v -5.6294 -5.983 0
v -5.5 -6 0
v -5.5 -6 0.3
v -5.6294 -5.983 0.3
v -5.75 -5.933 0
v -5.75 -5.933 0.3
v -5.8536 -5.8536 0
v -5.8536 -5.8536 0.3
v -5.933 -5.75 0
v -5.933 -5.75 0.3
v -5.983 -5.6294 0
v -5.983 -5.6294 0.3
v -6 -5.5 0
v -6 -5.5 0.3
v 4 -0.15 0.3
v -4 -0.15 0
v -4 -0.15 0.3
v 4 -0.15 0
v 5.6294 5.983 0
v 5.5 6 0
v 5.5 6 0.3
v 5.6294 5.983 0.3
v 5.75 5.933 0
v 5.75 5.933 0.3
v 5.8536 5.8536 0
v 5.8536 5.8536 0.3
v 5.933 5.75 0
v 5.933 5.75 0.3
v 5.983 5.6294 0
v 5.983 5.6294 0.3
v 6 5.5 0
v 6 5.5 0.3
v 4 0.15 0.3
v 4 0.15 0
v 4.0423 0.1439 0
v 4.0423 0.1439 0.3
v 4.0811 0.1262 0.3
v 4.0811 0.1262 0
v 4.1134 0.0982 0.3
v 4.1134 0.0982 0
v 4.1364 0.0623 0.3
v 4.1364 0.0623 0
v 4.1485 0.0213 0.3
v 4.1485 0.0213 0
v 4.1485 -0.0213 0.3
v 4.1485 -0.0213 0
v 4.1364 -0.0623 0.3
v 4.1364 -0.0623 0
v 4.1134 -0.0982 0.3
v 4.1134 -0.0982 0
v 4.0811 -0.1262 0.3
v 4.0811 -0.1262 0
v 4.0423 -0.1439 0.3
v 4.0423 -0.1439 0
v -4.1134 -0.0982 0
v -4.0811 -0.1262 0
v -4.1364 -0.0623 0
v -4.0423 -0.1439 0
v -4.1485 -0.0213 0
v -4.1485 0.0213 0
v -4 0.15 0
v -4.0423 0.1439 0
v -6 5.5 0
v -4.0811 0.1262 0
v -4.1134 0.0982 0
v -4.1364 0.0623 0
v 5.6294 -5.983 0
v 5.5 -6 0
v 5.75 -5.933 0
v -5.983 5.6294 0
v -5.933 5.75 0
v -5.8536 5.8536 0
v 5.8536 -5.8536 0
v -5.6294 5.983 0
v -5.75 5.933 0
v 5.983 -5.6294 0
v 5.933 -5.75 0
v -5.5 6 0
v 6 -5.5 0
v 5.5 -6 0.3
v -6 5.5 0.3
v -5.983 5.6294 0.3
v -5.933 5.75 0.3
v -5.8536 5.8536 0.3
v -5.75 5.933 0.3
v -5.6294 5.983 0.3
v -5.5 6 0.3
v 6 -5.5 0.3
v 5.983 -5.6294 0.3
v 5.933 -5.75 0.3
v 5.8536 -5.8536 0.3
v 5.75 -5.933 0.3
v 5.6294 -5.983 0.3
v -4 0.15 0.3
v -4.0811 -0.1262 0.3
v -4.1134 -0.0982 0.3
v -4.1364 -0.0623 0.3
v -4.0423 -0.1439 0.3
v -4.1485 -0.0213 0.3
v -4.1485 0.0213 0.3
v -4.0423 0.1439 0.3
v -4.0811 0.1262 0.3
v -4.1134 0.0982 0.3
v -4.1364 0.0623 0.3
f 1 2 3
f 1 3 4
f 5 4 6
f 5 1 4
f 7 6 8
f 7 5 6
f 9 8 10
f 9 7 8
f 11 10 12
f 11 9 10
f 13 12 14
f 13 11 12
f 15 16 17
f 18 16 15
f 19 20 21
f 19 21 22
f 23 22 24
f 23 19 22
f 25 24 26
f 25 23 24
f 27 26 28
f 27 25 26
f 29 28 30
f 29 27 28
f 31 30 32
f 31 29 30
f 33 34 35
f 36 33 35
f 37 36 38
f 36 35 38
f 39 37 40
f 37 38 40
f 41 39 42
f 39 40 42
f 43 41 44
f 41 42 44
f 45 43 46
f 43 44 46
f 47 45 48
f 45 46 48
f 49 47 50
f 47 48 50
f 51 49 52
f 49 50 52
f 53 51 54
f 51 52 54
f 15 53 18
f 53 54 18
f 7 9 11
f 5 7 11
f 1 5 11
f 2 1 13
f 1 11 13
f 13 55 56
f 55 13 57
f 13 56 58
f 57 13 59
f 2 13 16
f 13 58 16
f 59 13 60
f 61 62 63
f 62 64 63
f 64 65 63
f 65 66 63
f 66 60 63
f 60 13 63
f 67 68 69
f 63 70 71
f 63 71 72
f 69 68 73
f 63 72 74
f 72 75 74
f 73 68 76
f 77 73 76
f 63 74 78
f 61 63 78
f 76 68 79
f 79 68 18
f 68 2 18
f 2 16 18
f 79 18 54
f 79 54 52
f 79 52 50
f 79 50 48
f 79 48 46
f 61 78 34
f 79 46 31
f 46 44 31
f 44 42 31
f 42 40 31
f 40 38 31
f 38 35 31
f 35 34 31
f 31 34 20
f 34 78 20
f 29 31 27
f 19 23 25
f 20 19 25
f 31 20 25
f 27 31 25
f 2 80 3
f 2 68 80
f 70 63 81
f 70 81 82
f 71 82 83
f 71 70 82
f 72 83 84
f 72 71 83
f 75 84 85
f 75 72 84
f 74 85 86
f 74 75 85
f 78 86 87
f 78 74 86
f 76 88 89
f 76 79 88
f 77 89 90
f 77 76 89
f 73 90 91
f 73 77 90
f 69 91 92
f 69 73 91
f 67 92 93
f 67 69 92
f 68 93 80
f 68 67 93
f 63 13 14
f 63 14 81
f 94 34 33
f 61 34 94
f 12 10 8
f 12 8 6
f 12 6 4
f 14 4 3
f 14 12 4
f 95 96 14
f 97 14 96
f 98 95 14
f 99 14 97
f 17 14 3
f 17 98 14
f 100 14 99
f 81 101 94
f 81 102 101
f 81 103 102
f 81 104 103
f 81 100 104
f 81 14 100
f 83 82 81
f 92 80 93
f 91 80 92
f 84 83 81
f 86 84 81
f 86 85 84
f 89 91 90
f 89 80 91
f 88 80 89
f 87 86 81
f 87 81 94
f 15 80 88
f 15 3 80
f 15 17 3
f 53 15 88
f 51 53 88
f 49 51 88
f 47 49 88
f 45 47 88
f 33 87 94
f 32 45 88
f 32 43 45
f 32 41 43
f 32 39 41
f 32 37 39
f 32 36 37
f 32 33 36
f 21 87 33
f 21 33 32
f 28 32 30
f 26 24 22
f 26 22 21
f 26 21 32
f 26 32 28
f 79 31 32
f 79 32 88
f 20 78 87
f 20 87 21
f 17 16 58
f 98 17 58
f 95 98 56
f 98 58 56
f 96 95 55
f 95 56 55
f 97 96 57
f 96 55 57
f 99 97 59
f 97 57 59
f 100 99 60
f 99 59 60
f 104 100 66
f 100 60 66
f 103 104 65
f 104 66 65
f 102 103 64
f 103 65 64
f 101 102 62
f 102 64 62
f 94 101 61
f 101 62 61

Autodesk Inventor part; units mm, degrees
ref_plane "YZ Plane" through (0, 0, 0) normal (1, 0, 0) x (0, 1, 0)
ref_plane "XZ Plane" through (0, 0, 0) normal (0, 1, 0) x (-1, 0, 0)
ref_plane "XY Plane" through (0, 0, 0) normal (0, 0, 1) x (1, 0, 0)
sketch "Sketch1" plane through (0, 0, 0) normal (0, 0, 1) x (1, 0, 0)
  line L0 (-5.5, 6) -> (5.5, 6)
  line L1 (6, 5.5) -> (6, -5.5)
  line L2 (5.5, -6) -> (-5.5, -6)
  line L3 (-6, -5.5) -> (-6, 5.5)
  line L4 (-6, 6) -> (6, -6) construction
  line L5 (6, 6) -> (-6, -6) construction
  line L6 (-4, 0) -> (4, 0) construction
  line L7 (-4, -0.15) -> (4, -0.15)
  line L8 (4, 0.15) -> (-4, 0.15)
  arc A0 (-4, 0.15) -> (-4, -0.15) centre (-4, 0) ccw
  arc A1 (4, -0.15) -> (4, 0.15) centre (4, 0) ccw
  arc A2 (-5.5, 6) -> (-6, 5.5) centre (-5.5, 5.5) ccw
  arc A3 (-6, -5.5) -> (-5.5, -6) centre (-5.5, -5.5) ccw
  arc A4 (5.5, -6) -> (6, -5.5) centre (5.5, -5.5) ccw
  arc A5 (6, 5.5) -> (5.5, 6) centre (5.5, 5.5) ccw
  point P0 (0, 0)
  dimension "d0" = 12
  dimension "d1" = 12
  dimension "d2" = 4
  dimension "d3" = 0.3
  dimension "d4" = 0.5
extrude "Plate1" add sketch "Sketch1" along normal blind 0.3
equation "\"d5\" = Thickness"
equation "\"BendRadius\" = Thickness"
equation "\"BendReliefWidth\" = Thickness"
equation "\"BendReliefDepth\" = 0.5 * Thickness"
equation "\"CornerReliefSize\" = 4 * Thickness"
equation "\"MinimumRemnant\" = 2 * Thickness"
equation "\"TransitionRadius\" = BendRadius"
equation "\"JacobiRadiusSize\" = BendRadius"
equation "\"GapSize\" = Thickness"
equation "\"Thickness\" = 0.3"
properties part number "Slit" material "Stainless Steel, Austenitic"
